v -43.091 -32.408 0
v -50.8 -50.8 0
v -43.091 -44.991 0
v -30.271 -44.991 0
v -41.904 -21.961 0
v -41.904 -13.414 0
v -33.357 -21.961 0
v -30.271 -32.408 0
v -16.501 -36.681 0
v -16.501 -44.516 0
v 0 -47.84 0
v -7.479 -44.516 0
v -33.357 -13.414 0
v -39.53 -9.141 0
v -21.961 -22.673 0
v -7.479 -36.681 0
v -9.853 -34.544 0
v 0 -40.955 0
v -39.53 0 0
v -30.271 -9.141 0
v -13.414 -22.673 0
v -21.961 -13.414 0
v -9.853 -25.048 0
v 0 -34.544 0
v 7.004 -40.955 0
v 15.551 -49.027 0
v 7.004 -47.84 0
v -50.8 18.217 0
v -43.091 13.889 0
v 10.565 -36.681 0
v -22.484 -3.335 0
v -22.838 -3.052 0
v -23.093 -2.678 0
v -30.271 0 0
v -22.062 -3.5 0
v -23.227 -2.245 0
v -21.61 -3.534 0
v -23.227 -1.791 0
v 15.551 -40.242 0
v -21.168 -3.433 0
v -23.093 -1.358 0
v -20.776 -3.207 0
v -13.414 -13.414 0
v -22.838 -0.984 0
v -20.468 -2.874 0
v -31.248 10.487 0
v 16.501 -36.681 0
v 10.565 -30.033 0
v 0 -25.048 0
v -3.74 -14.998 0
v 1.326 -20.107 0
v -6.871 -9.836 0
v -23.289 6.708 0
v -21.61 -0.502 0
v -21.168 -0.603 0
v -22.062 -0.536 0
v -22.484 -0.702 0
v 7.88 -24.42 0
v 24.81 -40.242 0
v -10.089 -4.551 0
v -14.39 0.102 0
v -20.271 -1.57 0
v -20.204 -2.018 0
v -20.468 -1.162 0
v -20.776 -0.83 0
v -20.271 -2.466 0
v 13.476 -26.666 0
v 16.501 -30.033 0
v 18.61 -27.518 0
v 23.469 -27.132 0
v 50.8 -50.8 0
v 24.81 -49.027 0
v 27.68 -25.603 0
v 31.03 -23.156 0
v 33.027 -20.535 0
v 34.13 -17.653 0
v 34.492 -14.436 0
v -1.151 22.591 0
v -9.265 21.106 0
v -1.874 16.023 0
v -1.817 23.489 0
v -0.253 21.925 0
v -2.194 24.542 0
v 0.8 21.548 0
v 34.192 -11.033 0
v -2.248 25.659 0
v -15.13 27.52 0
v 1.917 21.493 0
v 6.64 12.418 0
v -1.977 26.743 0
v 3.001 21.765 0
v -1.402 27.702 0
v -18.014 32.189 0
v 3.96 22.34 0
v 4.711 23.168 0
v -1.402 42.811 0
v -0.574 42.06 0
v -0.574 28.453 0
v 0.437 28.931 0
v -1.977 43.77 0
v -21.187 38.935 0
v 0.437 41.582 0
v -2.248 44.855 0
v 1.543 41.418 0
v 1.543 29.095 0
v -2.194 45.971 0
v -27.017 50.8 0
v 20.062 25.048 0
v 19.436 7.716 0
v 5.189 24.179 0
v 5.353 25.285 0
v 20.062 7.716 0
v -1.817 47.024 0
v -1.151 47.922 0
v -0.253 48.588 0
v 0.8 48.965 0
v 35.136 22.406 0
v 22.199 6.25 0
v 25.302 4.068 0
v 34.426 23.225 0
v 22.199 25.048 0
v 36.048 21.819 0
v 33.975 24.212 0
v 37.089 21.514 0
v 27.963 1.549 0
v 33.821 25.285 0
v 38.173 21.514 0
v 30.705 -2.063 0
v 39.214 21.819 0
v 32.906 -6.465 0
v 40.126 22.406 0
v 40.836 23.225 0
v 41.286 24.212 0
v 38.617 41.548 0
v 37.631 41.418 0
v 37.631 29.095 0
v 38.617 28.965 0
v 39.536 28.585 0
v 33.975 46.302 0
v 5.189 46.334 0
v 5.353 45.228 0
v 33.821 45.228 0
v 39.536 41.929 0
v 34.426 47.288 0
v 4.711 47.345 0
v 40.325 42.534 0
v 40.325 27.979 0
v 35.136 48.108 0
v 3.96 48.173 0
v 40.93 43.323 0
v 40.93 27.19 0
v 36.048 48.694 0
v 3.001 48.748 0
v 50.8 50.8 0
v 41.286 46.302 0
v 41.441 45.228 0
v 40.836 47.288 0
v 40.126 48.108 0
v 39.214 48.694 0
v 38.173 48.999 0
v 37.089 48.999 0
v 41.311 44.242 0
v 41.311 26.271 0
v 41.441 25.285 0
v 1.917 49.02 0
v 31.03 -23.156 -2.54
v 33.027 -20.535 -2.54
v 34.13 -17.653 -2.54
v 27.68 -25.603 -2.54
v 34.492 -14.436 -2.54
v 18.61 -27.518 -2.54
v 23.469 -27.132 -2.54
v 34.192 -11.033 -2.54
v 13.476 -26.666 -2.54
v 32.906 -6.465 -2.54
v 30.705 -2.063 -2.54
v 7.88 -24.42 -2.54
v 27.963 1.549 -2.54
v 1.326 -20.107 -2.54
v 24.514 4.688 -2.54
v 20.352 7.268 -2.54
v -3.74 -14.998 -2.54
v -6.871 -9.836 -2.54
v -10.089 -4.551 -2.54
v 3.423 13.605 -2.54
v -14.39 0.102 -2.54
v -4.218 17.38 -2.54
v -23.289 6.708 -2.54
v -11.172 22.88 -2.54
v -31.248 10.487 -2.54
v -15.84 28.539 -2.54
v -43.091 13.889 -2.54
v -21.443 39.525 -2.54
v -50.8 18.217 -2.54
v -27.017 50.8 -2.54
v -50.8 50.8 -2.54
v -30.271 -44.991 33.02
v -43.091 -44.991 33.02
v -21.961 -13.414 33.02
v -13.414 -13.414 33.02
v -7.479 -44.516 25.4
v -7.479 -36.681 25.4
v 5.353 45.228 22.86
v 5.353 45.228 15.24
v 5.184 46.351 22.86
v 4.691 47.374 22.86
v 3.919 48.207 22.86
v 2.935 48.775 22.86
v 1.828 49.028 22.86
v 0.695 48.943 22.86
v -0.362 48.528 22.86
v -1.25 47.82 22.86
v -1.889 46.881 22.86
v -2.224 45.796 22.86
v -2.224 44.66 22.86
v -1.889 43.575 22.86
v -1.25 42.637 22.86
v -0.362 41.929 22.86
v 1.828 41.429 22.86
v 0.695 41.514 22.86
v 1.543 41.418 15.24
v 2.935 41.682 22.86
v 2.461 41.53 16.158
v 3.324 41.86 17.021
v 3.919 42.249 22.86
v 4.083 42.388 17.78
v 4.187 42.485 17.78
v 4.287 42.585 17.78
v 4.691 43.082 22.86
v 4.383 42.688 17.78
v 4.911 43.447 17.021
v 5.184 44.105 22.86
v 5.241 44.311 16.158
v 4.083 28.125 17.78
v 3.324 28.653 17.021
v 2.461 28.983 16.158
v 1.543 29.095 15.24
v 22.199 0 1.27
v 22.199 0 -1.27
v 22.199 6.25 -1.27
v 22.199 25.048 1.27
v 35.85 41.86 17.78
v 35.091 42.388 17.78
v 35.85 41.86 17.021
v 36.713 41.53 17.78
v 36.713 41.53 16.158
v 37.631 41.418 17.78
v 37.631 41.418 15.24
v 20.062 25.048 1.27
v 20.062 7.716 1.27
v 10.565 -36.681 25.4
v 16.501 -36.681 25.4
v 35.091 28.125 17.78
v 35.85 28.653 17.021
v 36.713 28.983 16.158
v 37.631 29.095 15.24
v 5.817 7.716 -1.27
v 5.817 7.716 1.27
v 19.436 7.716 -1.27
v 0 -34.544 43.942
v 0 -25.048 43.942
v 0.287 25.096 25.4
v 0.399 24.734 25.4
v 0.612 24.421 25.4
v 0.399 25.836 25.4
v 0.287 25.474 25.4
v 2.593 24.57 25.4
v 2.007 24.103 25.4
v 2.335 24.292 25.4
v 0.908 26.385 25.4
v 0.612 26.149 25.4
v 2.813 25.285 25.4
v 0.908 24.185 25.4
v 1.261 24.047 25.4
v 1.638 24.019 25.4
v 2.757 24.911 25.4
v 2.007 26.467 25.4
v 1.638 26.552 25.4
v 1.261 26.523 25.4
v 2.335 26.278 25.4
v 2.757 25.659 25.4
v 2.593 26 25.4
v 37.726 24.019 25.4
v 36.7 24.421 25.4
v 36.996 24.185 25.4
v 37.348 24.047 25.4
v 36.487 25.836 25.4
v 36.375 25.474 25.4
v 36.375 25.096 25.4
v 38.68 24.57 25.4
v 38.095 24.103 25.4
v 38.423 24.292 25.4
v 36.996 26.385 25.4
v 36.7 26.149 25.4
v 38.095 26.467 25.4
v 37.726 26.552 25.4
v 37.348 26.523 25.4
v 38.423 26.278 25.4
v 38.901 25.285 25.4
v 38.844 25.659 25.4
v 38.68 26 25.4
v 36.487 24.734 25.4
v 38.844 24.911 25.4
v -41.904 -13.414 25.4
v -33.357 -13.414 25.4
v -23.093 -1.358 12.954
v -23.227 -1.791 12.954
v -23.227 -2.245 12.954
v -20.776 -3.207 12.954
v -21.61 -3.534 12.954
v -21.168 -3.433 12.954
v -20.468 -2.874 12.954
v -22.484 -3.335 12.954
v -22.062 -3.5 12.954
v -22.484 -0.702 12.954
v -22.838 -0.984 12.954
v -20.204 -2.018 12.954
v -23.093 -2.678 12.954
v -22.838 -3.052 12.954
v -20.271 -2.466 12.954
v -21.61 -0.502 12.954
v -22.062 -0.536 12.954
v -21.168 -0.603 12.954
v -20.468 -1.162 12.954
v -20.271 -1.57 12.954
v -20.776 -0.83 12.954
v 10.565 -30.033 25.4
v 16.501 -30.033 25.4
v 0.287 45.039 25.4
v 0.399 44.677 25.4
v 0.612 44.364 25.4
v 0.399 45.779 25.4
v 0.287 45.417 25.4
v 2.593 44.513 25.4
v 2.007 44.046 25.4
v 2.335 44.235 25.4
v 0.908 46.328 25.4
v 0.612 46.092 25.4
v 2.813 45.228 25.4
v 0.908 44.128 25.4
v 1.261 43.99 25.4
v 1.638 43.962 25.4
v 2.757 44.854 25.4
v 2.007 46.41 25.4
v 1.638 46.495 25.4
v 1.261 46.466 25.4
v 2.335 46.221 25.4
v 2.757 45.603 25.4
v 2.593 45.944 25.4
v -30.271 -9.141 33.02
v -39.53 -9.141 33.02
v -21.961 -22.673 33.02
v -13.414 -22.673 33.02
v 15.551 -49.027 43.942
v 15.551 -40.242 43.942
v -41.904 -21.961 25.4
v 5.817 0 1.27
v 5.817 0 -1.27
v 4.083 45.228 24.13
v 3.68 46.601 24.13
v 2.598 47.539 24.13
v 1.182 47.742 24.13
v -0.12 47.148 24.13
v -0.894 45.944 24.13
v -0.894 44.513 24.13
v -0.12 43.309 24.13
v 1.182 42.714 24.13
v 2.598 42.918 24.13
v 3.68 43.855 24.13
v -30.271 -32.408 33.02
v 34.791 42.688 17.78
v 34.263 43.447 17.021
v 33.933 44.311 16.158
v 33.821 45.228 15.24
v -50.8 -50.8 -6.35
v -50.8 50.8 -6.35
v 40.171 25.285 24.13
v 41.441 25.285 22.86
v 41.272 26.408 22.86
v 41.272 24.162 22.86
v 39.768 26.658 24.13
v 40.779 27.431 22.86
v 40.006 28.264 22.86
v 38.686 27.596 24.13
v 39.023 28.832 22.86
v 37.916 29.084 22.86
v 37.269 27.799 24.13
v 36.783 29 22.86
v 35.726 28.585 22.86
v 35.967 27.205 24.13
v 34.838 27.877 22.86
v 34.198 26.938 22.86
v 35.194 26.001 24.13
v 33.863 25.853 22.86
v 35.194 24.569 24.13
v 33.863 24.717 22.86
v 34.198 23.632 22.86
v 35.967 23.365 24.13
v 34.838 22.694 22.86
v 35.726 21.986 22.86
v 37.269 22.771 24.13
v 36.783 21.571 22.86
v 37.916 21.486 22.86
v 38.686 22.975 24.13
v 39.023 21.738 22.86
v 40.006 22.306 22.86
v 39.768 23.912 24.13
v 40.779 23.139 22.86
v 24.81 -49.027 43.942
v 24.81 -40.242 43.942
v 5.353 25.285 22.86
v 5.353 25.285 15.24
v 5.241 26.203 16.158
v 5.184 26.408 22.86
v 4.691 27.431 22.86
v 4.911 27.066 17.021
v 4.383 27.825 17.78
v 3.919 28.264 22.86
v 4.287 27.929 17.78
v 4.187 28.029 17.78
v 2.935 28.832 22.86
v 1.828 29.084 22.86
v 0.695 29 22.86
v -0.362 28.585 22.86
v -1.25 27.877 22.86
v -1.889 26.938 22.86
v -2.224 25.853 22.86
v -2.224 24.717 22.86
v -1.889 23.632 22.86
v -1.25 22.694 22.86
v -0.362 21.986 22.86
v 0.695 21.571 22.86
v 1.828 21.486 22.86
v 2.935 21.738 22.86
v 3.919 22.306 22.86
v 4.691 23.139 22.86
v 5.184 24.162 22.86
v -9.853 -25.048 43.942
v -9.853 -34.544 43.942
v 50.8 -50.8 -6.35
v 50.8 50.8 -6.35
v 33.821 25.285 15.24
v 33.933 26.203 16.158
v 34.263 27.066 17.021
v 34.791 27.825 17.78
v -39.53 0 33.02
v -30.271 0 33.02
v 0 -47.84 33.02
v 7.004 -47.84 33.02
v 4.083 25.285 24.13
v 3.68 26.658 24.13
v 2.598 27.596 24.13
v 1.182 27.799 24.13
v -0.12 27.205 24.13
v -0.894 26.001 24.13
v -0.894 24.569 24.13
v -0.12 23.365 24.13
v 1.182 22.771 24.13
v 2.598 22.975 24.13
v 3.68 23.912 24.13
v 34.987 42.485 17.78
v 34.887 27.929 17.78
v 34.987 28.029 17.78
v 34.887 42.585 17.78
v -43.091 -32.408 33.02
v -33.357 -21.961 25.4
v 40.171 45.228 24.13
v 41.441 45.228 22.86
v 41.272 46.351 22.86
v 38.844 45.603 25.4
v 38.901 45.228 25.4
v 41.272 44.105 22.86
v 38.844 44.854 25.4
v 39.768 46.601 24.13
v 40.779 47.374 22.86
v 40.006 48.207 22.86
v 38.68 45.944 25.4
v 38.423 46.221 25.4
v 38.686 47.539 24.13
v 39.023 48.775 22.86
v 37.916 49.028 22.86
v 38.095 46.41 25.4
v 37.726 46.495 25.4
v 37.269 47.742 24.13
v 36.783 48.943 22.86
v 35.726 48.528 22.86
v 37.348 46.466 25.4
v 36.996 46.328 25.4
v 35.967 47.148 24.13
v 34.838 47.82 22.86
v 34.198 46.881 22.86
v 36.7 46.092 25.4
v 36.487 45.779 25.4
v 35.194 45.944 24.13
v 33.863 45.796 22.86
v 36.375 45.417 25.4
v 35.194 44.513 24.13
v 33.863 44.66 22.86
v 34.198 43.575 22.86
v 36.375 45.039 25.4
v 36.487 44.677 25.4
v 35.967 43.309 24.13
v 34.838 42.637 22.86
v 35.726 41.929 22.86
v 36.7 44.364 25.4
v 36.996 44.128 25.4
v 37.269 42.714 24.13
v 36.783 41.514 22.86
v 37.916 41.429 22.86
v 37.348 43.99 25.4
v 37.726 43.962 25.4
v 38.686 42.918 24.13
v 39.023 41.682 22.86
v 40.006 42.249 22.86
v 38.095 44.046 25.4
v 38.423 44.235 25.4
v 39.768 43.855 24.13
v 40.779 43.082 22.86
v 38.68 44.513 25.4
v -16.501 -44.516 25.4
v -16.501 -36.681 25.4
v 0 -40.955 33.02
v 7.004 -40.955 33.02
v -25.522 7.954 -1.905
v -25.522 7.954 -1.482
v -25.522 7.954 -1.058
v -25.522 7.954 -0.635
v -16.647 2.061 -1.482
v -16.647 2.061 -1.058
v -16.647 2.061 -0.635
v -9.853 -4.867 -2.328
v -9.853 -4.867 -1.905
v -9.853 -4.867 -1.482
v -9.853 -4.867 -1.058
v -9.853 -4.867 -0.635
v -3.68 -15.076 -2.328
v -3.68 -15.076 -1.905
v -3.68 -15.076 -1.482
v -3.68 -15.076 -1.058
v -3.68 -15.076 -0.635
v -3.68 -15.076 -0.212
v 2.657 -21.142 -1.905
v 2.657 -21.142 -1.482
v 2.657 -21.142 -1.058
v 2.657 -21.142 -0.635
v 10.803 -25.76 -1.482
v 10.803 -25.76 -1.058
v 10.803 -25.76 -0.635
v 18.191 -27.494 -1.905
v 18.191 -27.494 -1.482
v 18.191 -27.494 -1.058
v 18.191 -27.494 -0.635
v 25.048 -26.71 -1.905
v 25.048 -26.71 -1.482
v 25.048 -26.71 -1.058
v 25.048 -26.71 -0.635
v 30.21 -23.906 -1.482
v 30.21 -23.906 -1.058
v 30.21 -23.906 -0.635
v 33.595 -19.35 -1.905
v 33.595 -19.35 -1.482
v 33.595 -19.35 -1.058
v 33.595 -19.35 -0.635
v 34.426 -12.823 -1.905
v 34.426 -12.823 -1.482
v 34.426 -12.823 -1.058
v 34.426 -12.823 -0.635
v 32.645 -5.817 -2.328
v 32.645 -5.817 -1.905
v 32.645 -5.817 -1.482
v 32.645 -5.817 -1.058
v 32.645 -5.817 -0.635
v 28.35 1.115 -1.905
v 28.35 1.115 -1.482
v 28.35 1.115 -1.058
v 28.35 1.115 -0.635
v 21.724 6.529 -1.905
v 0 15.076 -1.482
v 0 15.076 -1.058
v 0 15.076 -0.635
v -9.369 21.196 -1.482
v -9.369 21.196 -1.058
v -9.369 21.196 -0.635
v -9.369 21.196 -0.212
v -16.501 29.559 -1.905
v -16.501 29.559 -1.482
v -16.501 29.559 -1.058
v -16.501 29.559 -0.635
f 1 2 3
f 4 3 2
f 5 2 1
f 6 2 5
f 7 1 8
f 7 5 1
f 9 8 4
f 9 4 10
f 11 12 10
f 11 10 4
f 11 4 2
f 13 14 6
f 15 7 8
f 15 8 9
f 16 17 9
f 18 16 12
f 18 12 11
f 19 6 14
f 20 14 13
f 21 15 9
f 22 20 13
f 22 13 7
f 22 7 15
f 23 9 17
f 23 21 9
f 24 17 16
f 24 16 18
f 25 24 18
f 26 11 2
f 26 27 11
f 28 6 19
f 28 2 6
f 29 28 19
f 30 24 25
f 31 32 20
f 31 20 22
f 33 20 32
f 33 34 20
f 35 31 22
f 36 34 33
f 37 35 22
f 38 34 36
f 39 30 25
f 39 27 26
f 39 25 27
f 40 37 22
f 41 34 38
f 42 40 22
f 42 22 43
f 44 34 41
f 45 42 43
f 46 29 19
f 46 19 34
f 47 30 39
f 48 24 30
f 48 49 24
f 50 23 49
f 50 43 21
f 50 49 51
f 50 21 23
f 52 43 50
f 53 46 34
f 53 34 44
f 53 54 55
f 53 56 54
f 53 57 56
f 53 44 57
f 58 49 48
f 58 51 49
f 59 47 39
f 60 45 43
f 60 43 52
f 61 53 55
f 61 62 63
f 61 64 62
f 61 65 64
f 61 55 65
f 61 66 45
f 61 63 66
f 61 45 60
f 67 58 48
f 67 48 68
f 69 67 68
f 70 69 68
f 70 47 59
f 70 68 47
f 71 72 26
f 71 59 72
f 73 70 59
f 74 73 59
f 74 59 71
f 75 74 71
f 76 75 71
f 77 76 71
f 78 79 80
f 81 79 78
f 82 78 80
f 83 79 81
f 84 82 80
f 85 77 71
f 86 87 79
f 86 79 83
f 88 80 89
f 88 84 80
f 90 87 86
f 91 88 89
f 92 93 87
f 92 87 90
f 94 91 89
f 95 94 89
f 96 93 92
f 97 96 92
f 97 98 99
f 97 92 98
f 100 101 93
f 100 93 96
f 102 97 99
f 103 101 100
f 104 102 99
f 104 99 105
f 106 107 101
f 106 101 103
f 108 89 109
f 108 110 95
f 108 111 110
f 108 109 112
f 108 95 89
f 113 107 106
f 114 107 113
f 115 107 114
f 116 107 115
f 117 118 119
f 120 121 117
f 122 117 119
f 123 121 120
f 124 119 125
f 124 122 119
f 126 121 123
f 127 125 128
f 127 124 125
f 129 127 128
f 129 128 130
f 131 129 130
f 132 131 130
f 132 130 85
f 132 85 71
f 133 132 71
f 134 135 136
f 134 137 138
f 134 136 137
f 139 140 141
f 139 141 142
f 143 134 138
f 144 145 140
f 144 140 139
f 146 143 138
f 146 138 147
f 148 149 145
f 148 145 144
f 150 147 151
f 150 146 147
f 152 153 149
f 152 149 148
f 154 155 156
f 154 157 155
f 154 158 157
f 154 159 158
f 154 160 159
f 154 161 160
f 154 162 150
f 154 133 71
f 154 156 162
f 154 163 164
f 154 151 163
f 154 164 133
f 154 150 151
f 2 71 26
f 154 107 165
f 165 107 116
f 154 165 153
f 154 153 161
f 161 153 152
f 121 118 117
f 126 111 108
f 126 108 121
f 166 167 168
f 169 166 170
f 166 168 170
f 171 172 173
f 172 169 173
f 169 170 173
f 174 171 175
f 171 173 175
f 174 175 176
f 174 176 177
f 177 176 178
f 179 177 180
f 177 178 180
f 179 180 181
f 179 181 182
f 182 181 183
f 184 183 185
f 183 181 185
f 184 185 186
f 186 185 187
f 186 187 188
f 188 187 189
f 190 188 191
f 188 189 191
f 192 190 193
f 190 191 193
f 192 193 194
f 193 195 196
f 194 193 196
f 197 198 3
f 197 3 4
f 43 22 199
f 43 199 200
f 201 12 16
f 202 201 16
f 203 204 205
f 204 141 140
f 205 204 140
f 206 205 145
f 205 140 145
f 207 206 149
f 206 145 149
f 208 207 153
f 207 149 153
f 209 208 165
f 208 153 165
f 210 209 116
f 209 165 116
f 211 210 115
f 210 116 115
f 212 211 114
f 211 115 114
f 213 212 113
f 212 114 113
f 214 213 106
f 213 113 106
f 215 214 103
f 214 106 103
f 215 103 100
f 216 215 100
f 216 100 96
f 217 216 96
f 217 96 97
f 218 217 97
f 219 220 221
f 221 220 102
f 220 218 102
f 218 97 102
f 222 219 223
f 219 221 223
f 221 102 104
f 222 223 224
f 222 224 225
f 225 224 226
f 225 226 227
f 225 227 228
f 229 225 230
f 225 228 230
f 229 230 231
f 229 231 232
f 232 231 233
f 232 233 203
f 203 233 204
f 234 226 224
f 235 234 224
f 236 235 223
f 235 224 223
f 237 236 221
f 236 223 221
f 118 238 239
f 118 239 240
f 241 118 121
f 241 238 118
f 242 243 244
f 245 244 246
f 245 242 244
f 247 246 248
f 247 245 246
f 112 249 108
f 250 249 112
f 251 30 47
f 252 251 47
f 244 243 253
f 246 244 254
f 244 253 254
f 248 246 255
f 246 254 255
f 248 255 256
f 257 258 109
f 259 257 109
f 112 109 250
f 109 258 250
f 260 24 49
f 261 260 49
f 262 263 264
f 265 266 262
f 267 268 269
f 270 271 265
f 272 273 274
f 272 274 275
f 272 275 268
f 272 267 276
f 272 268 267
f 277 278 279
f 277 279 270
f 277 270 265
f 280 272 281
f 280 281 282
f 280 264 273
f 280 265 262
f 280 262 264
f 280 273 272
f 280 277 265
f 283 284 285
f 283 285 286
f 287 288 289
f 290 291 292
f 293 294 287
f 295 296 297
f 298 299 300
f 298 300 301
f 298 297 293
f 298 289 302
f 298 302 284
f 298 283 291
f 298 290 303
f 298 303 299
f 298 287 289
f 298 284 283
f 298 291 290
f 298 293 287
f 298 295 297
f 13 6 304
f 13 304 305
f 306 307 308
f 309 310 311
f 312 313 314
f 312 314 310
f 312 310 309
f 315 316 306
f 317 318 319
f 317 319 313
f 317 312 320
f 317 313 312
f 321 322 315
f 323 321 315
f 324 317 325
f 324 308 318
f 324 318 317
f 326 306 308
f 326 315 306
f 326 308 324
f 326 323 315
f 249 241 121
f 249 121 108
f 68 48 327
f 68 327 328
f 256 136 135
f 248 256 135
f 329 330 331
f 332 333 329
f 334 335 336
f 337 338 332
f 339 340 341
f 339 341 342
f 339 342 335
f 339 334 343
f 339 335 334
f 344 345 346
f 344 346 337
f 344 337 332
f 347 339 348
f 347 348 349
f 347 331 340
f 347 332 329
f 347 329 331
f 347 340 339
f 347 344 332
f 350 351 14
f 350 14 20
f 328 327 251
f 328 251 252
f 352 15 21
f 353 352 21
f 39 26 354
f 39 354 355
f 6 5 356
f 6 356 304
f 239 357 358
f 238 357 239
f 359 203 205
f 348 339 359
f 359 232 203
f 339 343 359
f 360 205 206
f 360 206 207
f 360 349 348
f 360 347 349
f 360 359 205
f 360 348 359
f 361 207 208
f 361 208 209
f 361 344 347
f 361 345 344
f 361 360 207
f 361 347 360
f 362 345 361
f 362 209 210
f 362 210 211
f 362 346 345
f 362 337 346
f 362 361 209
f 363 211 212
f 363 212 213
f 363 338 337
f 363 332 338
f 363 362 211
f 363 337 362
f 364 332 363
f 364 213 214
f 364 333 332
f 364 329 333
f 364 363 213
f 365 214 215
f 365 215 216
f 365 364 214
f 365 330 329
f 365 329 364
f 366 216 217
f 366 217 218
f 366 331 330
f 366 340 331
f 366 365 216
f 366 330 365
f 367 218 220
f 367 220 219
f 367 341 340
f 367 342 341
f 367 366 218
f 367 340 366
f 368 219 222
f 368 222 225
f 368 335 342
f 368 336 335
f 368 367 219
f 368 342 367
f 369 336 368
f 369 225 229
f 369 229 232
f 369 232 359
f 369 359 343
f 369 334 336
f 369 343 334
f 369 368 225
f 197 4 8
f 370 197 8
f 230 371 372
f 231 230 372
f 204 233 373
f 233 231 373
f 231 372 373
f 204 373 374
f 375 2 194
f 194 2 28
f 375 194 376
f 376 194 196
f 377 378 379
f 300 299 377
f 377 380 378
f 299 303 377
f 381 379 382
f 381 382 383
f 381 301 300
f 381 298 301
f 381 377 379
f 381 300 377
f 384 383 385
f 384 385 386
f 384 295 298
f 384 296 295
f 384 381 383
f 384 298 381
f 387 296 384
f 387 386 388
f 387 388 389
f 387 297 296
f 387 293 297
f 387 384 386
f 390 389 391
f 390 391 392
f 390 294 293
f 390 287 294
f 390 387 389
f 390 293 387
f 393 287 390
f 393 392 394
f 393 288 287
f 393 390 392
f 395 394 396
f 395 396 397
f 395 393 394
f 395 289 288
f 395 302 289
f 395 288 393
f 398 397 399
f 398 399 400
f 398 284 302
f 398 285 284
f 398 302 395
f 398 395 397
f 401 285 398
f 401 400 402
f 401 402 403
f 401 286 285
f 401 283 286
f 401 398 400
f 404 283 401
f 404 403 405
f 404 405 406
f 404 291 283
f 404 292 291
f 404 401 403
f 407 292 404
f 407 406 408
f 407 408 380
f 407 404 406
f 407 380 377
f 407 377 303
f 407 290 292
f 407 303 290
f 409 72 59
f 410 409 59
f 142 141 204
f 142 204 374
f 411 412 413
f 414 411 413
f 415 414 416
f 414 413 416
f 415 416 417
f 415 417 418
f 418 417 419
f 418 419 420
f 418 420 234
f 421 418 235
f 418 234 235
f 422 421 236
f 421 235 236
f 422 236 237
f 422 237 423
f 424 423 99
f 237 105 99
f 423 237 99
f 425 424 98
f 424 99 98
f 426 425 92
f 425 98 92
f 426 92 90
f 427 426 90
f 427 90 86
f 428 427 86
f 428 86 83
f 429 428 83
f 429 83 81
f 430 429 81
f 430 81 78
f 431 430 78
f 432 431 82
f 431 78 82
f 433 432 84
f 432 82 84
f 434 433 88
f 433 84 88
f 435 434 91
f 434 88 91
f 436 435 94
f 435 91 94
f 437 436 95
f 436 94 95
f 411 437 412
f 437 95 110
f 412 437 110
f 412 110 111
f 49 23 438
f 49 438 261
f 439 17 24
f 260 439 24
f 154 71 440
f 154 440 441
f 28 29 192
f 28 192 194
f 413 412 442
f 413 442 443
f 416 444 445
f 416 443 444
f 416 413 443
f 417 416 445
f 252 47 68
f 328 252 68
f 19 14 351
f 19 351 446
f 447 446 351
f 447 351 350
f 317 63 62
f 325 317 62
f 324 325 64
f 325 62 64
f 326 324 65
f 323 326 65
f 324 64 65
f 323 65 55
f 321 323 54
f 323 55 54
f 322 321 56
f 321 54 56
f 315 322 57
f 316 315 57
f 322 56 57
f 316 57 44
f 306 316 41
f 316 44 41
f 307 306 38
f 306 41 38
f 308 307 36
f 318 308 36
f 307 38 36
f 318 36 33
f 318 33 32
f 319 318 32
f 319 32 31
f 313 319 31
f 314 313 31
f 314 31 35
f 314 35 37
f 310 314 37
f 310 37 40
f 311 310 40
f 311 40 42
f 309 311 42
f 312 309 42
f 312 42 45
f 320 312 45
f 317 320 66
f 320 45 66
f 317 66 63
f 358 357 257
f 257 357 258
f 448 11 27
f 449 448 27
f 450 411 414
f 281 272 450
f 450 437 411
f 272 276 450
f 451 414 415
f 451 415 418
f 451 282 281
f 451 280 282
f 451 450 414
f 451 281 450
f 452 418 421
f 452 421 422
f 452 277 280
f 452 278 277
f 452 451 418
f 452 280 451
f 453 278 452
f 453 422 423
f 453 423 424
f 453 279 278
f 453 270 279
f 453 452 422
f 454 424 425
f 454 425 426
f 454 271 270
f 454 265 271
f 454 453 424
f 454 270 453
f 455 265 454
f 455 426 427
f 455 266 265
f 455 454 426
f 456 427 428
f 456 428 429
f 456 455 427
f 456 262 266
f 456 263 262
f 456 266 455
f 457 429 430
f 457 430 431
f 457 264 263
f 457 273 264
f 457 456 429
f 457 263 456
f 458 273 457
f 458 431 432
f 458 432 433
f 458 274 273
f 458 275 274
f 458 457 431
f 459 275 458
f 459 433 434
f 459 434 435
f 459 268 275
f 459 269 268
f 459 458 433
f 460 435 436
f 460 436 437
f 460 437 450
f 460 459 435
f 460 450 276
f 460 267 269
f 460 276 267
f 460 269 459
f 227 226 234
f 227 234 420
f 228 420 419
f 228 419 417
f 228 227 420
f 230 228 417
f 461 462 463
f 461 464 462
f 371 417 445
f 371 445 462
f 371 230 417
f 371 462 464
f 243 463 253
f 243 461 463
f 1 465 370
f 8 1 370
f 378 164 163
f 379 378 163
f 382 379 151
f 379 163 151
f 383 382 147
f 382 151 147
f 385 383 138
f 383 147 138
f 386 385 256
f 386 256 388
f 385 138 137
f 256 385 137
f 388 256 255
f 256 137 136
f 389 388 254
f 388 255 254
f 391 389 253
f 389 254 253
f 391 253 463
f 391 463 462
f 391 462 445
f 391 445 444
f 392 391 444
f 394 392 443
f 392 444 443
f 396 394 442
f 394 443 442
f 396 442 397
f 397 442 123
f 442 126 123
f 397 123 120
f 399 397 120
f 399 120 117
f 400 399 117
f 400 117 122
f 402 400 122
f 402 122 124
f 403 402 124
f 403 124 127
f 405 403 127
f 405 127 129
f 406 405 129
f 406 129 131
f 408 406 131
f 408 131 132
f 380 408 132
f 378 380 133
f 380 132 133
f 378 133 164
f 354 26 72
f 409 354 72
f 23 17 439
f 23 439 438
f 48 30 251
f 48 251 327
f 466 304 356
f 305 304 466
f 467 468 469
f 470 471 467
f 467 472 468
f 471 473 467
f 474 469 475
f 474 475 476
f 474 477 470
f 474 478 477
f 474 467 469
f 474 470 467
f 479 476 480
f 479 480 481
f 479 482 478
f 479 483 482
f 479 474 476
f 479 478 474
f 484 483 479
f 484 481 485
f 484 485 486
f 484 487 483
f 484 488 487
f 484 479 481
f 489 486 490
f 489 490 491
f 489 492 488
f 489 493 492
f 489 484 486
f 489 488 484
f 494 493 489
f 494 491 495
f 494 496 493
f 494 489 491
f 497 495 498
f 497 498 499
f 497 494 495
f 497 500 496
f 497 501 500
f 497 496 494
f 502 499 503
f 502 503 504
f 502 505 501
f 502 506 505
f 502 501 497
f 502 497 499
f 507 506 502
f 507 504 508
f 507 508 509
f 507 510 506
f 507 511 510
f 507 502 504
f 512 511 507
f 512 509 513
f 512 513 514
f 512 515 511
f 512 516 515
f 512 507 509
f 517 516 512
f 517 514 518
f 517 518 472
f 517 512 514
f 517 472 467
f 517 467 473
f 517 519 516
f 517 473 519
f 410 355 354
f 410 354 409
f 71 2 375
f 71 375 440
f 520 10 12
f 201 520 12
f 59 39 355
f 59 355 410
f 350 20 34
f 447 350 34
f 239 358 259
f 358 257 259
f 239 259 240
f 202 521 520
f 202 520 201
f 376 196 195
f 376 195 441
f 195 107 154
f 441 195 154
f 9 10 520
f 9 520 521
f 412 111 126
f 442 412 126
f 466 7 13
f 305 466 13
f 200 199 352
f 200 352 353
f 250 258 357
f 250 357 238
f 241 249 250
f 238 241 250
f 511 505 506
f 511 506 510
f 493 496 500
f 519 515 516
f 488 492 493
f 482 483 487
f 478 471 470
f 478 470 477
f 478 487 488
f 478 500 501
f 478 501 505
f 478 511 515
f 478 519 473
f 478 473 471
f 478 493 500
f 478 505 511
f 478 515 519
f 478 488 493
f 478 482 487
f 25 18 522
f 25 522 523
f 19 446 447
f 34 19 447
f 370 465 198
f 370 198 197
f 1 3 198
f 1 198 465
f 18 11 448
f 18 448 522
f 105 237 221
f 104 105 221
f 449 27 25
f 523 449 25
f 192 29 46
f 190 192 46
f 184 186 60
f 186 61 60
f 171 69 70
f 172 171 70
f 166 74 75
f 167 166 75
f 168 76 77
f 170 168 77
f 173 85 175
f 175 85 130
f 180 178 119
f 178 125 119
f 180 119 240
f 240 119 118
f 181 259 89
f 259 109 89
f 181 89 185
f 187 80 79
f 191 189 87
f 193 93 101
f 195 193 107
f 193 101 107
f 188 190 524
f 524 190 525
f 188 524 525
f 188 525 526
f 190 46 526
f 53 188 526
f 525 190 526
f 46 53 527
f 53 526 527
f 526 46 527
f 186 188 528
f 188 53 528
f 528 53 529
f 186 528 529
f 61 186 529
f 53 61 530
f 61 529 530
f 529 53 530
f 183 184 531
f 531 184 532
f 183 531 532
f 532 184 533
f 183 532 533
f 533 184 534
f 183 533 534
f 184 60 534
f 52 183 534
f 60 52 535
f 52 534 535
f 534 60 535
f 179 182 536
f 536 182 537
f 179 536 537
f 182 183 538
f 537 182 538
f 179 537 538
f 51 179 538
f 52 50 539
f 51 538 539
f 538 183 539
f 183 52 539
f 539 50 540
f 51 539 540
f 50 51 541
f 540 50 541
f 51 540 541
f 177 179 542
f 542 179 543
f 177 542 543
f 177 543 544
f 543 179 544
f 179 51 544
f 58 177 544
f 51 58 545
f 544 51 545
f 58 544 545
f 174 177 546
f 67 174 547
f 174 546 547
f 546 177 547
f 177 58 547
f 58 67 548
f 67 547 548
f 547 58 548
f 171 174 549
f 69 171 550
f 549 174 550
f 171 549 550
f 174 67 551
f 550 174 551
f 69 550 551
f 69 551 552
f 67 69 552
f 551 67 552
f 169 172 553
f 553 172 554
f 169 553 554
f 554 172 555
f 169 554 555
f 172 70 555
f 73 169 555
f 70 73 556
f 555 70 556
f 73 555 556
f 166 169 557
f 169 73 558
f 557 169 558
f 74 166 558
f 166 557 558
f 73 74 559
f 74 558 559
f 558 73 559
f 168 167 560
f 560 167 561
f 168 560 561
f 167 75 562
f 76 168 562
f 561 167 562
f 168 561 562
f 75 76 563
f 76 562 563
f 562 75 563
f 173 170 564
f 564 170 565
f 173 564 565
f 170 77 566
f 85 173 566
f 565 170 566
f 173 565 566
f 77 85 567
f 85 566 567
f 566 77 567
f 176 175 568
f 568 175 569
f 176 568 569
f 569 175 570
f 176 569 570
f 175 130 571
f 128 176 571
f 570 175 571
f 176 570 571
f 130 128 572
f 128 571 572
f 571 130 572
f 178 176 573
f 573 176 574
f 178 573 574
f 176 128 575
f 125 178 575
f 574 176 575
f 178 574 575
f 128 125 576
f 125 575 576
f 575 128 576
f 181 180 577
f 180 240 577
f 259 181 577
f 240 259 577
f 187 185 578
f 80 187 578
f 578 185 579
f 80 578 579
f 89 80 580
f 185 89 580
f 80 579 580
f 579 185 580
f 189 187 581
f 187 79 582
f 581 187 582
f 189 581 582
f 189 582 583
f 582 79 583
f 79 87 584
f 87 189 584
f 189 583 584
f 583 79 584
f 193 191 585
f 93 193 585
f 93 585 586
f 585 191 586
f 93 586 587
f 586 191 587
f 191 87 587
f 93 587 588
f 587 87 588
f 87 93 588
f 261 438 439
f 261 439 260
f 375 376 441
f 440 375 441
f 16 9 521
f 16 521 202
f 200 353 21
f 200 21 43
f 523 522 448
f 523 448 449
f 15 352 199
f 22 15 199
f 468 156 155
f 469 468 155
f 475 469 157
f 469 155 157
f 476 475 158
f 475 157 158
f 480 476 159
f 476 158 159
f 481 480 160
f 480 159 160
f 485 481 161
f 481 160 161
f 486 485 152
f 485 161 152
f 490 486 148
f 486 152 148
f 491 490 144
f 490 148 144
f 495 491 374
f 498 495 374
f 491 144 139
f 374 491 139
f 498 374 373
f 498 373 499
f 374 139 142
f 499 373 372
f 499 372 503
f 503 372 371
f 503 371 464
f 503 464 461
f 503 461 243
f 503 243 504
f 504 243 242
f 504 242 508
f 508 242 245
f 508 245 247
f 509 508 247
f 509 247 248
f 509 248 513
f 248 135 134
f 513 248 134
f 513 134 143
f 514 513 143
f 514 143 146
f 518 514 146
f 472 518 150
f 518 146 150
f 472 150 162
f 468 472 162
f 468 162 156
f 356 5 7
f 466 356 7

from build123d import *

# Parameters (mm, degrees)
F0_W          = 101.6
F0_H          = 101.6
F1_DEPTH      = 6.35
F3_DEPTH      = 2.54
F4_W          = 8.5470639169
F4_H          = 8.5470620543
F4_W_2        = 9.0218987316
F4_H_2        = 7.8348070383
F4_W_3        = 5.9354603291
F4_H_3        = 6.6477134824
F10_DEPTH     = 25.4
F5_W          = 9.2593189329
F5_H          = 9.1406079009
F5_W_2        = 8.5470620543
F5_H_2        = 9.2593189329
F5_W_3        = 12.8205921501
F5_H_3        = 12.5831738114
F5_W_4        = 7.0038423873
F5_H_4        = 6.885137409
F11_DEPTH     = 33.02
F6_W          = 9.8528647795
F6_H          = 9.4967372715
F6_W_2        = 9.2593152076
F6_H_2        = 8.7844803929
F12_DEPTH     = 43.942
F7_R          = 1.5202204641
F13_DEPTH     = 12.954
F8_W          = 36.0875949264
F8_H          = 19.9431441724
F14_DEPTH     = 17.78
F15_R         = 3.81
F16_DEPTH     = 25.4
F17_SIZE      = 2.54
F18_T4_DEPTH  = 25.3872937513
F18_S5_R      = 3.81
F18_T6_DEPTH  = 14
F18_S7_R      = 3.81
F18_T8_DEPTH  = 14
F18_T12_DEPTH = 41.5317445052
F18_S13_R     = 3.81
F18_T14_DEPTH = 22
F18_S15_R     = 3.81
F18_T16_DEPTH = 22
F18_T20_DEPTH = 25.3872937513
F18_S21_R     = 3.81
F18_T22_DEPTH = 14
F18_S23_R     = 3.81
F18_T24_DEPTH = 14
F18_T28_DEPTH = 41.5317445052
F18_S29_R     = 3.81
F18_T30_DEPTH = 22
F18_S31_R     = 3.81
F18_T32_DEPTH = 22
F9_W          = 14.245100785
F9_H          = 7.716097869
F19_DEPTH     = 1.27


# Not quite as in the source:
# - a fillet or chamfer that OpenCascade refuses, or shapes differently, is made with other operations: its cross-section is extruded or revolved along the edge and cut away or added


with BuildPart() as f1:
    # F0 (on Top) → F1 (new body)
    with BuildSketch(Plane.XY):
        Rectangle(F0_W, F0_H)
    extrude(amount=-F1_DEPTH)

    # F2 (on Top) → F3 (cut)
    with BuildSketch(Plane.XY):
        with BuildLine():
            add(Edge.make_bspline(
                [(-43.0914387107, 13.8889765367), (-48.792132623, 16.8713450612), (-60.3046561951, 22.7349998179), (-64.7610317916, 39.255042485), (-64.8154675332, 45.423523183)],
                knots=[0, 0, 0, 0, 0.4841794351, 1, 1, 1, 1], degree=3))
            add(Edge.make_bspline(
                [(-43.0914387107, 13.8889765367), (-37.3227409256, 12.4784266372), (-25.238481151, 9.5236064613), (-8.5238992218, -4.1081865608), (-5.0933643721, -15.7347262944), (10.2382263796, -27.360890695), (25.1611930237, -28.3877213638), (35.757581674, -20.0820321549), (33.8435161562, -4.7561465103), (22.6073453238, 8.7237537482), (-1.0459930134, 13.2625730637), (-18.464949103, 28.4069952294), (-24.7392805682, 51.2806449877), (-36.4483970668, 62.0438769385), (-40.598793265, 65.3666710807)],
                knots=[0, 0, 0, 0, 0.0857293443, 0.1753055598, 0.2440669449, 0.3285210308, 0.4037415508, 0.4706009031, 0.5439255605, 0.6247496782, 0.7209366486, 0.814216246, 0.9108692703, 1, 1, 1, 1], degree=3))
            Line((-40.598793265, 65.3666710807), (-64.8154675332, 45.423523183))
        make_face()
    extrude(amount=-F3_DEPTH, mode=Mode.SUBTRACT)

    # F4 (on Top) → F10 (join)
    with BuildSketch(Plane.XY):
        with Locations((-37.6308169216, -17.6876699552)):
            Rectangle(F4_W, F4_H)
        with Locations((-11.9896298274, -40.5985452235)):
            Rectangle(F4_W_2, F4_H_2)
        with Locations((13.5328508914, -33.3572849631)):
            Rectangle(F4_W_3, F4_H_3)
    extrude(amount=F10_DEPTH)

    # F5 (on Top) → F11 (join)
    with BuildSketch(Plane.XY):
        with Locations((-34.900506027, -4.5703039505)):
            Rectangle(F5_W, F5_H)
        with Locations((-17.6876718178, -18.0437983945)):
            Rectangle(F5_W_2, F5_H_2)
        with Locations((-36.6811426356, -38.6991985142)):
            Rectangle(F5_W_3, F5_H_3)
        with Locations((3.5019211937, -44.3972405046)):
            Rectangle(F5_W_4, F5_H_4)
    extrude(amount=F11_DEPTH)

    # F6 (on Top) → F12 (join)
    with BuildSketch(Plane.XY):
        with Locations((-4.9264323898, -29.7960098833)):
            Rectangle(F6_W, F6_H)
        with Locations((20.1805653051, -44.6346588433)):
            Rectangle(F6_W_2, F6_H_2)
    extrude(amount=F12_DEPTH)

    # F7 (on Top) → F13 (join)
    with BuildSketch(Plane.XY):
        with Locations((-21.7237845063, -2.0180563442)):
            Circle(F7_R)
    extrude(amount=F13_DEPTH)

    # F8 (on Top) → F14 (join)
    with BuildSketch(Plane.XY):
        with Locations((19.5870175958, 35.2566316724)):
            Rectangle(F8_W, F8_H)
    extrude(amount=F14_DEPTH)

    # F15 (on Top) → F16 (join)
    with BuildSketch(Plane.XY):
        with Locations((1.5432201326, 45.2282037586)):
            Circle(F15_R)
        with Locations((37.6308150589, 45.2282037586)):
            Circle(F15_R)
        with Locations((37.6308150589, 25.2850595862)):
            Circle(F15_R)
        with Locations((1.5432201326, 25.2850595862)):
            Circle(F15_R)
    extrude(amount=F16_DEPTH)

    # F17
    f17_edges = [f1.edges().sort_by_distance(p)[0] for p in [
        (-2.26678, 45.228204, 25.4),
        (-2.26678, 25.28506, 25.4),
        (33.820815, 25.28506, 25.4),
        (33.820815, 45.228204, 25.4),
    ]]
    chamfer(f17_edges, length=F17_SIZE)

    # F18: chamfer of 2.54 on 4 edges, made by hand


with BuildPart() as f18_tool2:
    # F18_s3 → F18_t4 (new body)
    with BuildSketch(Plane.XZ.offset(-47.950278548)):
        Polygon((4.0832201326, 17.78), (1.5432201326, 15.24), (1.5432201326, 17.78), align=None)
    extrude(amount=F18_T4_DEPTH)

    # F18_s5 → F18_t6 (cut, symmetric)
    with BuildSketch(Plane.XY.offset(16.5)):
        with Locations((1.5432201326, 25.2850595862)):
            Circle(F18_S5_R)
    extrude(amount=F18_T6_DEPTH, both=True, mode=Mode.SUBTRACT)

    # F18_s7 → F18_t8 (cut, symmetric)
    with BuildSketch(Plane.XY.offset(16.5)):
        with Locations((1.5432201326, 45.2282037586)):
            Circle(F18_S7_R)
    extrude(amount=F18_T8_DEPTH, both=True, mode=Mode.SUBTRACT)


with BuildPart() as f1_1:
    add(f1.part)

    # F18_t1: cut F18_tool2
    add(f18_tool2.part, mode=Mode.SUBTRACT)


with BuildPart() as f18_tool10:
    # F18_s11 → F18_t12 (new body)
    with BuildSketch(Plane.YZ.offset(-1.1788546568)):
        Polygon((25.2850595862, 15.24), (27.8250595862, 17.78), (25.2850595862, 17.78), align=None)
    extrude(amount=F18_T12_DEPTH)

    # F18_s13 → F18_t14 (cut, symmetric)
    with BuildSketch(Plane.XY.offset(16.5)):
        with Locations((37.6308150589, 25.2850595862)):
            Circle(F18_S13_R)
    extrude(amount=F18_T14_DEPTH, both=True, mode=Mode.SUBTRACT)

    # F18_s15 → F18_t16 (cut, symmetric)
    with BuildSketch(Plane.XY.offset(16.5)):
        with Locations((1.5432201326, 25.2850595862)):
            Circle(F18_S15_R)
    extrude(amount=F18_T16_DEPTH, both=True, mode=Mode.SUBTRACT)


with BuildPart() as f1_2:
    add(f1_1.part)

    # F18_t9: cut F18_tool10
    add(f18_tool10.part, mode=Mode.SUBTRACT)


with BuildPart() as f18_tool18:
    # F18_s19 → F18_t20 (new body)
    with BuildSketch(Plane.XZ.offset(-22.5629847967)):
        Polygon((35.0908150589, 17.78), (37.6308150589, 15.24), (37.6308150589, 17.78), align=None)
    extrude(amount=-F18_T20_DEPTH)

    # F18_s21 → F18_t22 (cut, symmetric)
    with BuildSketch(Plane.XY.offset(16.5)):
        with Locations((37.6308150589, 25.2850595862)):
            Circle(F18_S21_R)
    extrude(amount=F18_T22_DEPTH, both=True, mode=Mode.SUBTRACT)

    # F18_s23 → F18_t24 (cut, symmetric)
    with BuildSketch(Plane.XY.offset(16.5)):
        with Locations((37.6308150589, 45.2282037586)):
            Circle(F18_S23_R)
    extrude(amount=F18_T24_DEPTH, both=True, mode=Mode.SUBTRACT)


with BuildPart() as f1_3:
    add(f1_2.part)

    # F18_t17: cut F18_tool18
    add(f18_tool18.part, mode=Mode.SUBTRACT)


with BuildPart() as f18_tool26:
    # F18_s27 → F18_t28 (new body)
    with BuildSketch(Plane.YZ.offset(40.3528898484)):
        Polygon((42.6882037586, 17.78), (45.2282037586, 15.24), (45.2282037586, 17.78), align=None)
    extrude(amount=-F18_T28_DEPTH)

    # F18_s29 → F18_t30 (cut, symmetric)
    with BuildSketch(Plane.XY.offset(16.5)):
        with Locations((1.5432201326, 45.2282037586)):
            Circle(F18_S29_R)
    extrude(amount=F18_T30_DEPTH, both=True, mode=Mode.SUBTRACT)

    # F18_s31 → F18_t32 (cut, symmetric)
    with BuildSketch(Plane.XY.offset(16.5)):
        with Locations((37.6308150589, 45.2282037586)):
            Circle(F18_S31_R)
    extrude(amount=F18_T32_DEPTH, both=True, mode=Mode.SUBTRACT)


with BuildPart() as f1_4:
    add(f1_3.part)

    # F18_t25: cut F18_tool26
    add(f18_tool26.part, mode=Mode.SUBTRACT)

    # F9 (on Top) → F19 (join, symmetric)
    with BuildSketch(Plane.XY):
        Polygon((22.1986230463, 0), (22.1986230463, 25.0476412475), (20.0618524104, 25.0476412475), (20.0618524104, 7.716097869), (20.0618524104, 0), align=None)
        with Locations((12.9393020179, 3.8580489345)):
            Rectangle(F9_W, F9_H)
    extrude(amount=F19_DEPTH, both=True)


solid = f1_4.part
